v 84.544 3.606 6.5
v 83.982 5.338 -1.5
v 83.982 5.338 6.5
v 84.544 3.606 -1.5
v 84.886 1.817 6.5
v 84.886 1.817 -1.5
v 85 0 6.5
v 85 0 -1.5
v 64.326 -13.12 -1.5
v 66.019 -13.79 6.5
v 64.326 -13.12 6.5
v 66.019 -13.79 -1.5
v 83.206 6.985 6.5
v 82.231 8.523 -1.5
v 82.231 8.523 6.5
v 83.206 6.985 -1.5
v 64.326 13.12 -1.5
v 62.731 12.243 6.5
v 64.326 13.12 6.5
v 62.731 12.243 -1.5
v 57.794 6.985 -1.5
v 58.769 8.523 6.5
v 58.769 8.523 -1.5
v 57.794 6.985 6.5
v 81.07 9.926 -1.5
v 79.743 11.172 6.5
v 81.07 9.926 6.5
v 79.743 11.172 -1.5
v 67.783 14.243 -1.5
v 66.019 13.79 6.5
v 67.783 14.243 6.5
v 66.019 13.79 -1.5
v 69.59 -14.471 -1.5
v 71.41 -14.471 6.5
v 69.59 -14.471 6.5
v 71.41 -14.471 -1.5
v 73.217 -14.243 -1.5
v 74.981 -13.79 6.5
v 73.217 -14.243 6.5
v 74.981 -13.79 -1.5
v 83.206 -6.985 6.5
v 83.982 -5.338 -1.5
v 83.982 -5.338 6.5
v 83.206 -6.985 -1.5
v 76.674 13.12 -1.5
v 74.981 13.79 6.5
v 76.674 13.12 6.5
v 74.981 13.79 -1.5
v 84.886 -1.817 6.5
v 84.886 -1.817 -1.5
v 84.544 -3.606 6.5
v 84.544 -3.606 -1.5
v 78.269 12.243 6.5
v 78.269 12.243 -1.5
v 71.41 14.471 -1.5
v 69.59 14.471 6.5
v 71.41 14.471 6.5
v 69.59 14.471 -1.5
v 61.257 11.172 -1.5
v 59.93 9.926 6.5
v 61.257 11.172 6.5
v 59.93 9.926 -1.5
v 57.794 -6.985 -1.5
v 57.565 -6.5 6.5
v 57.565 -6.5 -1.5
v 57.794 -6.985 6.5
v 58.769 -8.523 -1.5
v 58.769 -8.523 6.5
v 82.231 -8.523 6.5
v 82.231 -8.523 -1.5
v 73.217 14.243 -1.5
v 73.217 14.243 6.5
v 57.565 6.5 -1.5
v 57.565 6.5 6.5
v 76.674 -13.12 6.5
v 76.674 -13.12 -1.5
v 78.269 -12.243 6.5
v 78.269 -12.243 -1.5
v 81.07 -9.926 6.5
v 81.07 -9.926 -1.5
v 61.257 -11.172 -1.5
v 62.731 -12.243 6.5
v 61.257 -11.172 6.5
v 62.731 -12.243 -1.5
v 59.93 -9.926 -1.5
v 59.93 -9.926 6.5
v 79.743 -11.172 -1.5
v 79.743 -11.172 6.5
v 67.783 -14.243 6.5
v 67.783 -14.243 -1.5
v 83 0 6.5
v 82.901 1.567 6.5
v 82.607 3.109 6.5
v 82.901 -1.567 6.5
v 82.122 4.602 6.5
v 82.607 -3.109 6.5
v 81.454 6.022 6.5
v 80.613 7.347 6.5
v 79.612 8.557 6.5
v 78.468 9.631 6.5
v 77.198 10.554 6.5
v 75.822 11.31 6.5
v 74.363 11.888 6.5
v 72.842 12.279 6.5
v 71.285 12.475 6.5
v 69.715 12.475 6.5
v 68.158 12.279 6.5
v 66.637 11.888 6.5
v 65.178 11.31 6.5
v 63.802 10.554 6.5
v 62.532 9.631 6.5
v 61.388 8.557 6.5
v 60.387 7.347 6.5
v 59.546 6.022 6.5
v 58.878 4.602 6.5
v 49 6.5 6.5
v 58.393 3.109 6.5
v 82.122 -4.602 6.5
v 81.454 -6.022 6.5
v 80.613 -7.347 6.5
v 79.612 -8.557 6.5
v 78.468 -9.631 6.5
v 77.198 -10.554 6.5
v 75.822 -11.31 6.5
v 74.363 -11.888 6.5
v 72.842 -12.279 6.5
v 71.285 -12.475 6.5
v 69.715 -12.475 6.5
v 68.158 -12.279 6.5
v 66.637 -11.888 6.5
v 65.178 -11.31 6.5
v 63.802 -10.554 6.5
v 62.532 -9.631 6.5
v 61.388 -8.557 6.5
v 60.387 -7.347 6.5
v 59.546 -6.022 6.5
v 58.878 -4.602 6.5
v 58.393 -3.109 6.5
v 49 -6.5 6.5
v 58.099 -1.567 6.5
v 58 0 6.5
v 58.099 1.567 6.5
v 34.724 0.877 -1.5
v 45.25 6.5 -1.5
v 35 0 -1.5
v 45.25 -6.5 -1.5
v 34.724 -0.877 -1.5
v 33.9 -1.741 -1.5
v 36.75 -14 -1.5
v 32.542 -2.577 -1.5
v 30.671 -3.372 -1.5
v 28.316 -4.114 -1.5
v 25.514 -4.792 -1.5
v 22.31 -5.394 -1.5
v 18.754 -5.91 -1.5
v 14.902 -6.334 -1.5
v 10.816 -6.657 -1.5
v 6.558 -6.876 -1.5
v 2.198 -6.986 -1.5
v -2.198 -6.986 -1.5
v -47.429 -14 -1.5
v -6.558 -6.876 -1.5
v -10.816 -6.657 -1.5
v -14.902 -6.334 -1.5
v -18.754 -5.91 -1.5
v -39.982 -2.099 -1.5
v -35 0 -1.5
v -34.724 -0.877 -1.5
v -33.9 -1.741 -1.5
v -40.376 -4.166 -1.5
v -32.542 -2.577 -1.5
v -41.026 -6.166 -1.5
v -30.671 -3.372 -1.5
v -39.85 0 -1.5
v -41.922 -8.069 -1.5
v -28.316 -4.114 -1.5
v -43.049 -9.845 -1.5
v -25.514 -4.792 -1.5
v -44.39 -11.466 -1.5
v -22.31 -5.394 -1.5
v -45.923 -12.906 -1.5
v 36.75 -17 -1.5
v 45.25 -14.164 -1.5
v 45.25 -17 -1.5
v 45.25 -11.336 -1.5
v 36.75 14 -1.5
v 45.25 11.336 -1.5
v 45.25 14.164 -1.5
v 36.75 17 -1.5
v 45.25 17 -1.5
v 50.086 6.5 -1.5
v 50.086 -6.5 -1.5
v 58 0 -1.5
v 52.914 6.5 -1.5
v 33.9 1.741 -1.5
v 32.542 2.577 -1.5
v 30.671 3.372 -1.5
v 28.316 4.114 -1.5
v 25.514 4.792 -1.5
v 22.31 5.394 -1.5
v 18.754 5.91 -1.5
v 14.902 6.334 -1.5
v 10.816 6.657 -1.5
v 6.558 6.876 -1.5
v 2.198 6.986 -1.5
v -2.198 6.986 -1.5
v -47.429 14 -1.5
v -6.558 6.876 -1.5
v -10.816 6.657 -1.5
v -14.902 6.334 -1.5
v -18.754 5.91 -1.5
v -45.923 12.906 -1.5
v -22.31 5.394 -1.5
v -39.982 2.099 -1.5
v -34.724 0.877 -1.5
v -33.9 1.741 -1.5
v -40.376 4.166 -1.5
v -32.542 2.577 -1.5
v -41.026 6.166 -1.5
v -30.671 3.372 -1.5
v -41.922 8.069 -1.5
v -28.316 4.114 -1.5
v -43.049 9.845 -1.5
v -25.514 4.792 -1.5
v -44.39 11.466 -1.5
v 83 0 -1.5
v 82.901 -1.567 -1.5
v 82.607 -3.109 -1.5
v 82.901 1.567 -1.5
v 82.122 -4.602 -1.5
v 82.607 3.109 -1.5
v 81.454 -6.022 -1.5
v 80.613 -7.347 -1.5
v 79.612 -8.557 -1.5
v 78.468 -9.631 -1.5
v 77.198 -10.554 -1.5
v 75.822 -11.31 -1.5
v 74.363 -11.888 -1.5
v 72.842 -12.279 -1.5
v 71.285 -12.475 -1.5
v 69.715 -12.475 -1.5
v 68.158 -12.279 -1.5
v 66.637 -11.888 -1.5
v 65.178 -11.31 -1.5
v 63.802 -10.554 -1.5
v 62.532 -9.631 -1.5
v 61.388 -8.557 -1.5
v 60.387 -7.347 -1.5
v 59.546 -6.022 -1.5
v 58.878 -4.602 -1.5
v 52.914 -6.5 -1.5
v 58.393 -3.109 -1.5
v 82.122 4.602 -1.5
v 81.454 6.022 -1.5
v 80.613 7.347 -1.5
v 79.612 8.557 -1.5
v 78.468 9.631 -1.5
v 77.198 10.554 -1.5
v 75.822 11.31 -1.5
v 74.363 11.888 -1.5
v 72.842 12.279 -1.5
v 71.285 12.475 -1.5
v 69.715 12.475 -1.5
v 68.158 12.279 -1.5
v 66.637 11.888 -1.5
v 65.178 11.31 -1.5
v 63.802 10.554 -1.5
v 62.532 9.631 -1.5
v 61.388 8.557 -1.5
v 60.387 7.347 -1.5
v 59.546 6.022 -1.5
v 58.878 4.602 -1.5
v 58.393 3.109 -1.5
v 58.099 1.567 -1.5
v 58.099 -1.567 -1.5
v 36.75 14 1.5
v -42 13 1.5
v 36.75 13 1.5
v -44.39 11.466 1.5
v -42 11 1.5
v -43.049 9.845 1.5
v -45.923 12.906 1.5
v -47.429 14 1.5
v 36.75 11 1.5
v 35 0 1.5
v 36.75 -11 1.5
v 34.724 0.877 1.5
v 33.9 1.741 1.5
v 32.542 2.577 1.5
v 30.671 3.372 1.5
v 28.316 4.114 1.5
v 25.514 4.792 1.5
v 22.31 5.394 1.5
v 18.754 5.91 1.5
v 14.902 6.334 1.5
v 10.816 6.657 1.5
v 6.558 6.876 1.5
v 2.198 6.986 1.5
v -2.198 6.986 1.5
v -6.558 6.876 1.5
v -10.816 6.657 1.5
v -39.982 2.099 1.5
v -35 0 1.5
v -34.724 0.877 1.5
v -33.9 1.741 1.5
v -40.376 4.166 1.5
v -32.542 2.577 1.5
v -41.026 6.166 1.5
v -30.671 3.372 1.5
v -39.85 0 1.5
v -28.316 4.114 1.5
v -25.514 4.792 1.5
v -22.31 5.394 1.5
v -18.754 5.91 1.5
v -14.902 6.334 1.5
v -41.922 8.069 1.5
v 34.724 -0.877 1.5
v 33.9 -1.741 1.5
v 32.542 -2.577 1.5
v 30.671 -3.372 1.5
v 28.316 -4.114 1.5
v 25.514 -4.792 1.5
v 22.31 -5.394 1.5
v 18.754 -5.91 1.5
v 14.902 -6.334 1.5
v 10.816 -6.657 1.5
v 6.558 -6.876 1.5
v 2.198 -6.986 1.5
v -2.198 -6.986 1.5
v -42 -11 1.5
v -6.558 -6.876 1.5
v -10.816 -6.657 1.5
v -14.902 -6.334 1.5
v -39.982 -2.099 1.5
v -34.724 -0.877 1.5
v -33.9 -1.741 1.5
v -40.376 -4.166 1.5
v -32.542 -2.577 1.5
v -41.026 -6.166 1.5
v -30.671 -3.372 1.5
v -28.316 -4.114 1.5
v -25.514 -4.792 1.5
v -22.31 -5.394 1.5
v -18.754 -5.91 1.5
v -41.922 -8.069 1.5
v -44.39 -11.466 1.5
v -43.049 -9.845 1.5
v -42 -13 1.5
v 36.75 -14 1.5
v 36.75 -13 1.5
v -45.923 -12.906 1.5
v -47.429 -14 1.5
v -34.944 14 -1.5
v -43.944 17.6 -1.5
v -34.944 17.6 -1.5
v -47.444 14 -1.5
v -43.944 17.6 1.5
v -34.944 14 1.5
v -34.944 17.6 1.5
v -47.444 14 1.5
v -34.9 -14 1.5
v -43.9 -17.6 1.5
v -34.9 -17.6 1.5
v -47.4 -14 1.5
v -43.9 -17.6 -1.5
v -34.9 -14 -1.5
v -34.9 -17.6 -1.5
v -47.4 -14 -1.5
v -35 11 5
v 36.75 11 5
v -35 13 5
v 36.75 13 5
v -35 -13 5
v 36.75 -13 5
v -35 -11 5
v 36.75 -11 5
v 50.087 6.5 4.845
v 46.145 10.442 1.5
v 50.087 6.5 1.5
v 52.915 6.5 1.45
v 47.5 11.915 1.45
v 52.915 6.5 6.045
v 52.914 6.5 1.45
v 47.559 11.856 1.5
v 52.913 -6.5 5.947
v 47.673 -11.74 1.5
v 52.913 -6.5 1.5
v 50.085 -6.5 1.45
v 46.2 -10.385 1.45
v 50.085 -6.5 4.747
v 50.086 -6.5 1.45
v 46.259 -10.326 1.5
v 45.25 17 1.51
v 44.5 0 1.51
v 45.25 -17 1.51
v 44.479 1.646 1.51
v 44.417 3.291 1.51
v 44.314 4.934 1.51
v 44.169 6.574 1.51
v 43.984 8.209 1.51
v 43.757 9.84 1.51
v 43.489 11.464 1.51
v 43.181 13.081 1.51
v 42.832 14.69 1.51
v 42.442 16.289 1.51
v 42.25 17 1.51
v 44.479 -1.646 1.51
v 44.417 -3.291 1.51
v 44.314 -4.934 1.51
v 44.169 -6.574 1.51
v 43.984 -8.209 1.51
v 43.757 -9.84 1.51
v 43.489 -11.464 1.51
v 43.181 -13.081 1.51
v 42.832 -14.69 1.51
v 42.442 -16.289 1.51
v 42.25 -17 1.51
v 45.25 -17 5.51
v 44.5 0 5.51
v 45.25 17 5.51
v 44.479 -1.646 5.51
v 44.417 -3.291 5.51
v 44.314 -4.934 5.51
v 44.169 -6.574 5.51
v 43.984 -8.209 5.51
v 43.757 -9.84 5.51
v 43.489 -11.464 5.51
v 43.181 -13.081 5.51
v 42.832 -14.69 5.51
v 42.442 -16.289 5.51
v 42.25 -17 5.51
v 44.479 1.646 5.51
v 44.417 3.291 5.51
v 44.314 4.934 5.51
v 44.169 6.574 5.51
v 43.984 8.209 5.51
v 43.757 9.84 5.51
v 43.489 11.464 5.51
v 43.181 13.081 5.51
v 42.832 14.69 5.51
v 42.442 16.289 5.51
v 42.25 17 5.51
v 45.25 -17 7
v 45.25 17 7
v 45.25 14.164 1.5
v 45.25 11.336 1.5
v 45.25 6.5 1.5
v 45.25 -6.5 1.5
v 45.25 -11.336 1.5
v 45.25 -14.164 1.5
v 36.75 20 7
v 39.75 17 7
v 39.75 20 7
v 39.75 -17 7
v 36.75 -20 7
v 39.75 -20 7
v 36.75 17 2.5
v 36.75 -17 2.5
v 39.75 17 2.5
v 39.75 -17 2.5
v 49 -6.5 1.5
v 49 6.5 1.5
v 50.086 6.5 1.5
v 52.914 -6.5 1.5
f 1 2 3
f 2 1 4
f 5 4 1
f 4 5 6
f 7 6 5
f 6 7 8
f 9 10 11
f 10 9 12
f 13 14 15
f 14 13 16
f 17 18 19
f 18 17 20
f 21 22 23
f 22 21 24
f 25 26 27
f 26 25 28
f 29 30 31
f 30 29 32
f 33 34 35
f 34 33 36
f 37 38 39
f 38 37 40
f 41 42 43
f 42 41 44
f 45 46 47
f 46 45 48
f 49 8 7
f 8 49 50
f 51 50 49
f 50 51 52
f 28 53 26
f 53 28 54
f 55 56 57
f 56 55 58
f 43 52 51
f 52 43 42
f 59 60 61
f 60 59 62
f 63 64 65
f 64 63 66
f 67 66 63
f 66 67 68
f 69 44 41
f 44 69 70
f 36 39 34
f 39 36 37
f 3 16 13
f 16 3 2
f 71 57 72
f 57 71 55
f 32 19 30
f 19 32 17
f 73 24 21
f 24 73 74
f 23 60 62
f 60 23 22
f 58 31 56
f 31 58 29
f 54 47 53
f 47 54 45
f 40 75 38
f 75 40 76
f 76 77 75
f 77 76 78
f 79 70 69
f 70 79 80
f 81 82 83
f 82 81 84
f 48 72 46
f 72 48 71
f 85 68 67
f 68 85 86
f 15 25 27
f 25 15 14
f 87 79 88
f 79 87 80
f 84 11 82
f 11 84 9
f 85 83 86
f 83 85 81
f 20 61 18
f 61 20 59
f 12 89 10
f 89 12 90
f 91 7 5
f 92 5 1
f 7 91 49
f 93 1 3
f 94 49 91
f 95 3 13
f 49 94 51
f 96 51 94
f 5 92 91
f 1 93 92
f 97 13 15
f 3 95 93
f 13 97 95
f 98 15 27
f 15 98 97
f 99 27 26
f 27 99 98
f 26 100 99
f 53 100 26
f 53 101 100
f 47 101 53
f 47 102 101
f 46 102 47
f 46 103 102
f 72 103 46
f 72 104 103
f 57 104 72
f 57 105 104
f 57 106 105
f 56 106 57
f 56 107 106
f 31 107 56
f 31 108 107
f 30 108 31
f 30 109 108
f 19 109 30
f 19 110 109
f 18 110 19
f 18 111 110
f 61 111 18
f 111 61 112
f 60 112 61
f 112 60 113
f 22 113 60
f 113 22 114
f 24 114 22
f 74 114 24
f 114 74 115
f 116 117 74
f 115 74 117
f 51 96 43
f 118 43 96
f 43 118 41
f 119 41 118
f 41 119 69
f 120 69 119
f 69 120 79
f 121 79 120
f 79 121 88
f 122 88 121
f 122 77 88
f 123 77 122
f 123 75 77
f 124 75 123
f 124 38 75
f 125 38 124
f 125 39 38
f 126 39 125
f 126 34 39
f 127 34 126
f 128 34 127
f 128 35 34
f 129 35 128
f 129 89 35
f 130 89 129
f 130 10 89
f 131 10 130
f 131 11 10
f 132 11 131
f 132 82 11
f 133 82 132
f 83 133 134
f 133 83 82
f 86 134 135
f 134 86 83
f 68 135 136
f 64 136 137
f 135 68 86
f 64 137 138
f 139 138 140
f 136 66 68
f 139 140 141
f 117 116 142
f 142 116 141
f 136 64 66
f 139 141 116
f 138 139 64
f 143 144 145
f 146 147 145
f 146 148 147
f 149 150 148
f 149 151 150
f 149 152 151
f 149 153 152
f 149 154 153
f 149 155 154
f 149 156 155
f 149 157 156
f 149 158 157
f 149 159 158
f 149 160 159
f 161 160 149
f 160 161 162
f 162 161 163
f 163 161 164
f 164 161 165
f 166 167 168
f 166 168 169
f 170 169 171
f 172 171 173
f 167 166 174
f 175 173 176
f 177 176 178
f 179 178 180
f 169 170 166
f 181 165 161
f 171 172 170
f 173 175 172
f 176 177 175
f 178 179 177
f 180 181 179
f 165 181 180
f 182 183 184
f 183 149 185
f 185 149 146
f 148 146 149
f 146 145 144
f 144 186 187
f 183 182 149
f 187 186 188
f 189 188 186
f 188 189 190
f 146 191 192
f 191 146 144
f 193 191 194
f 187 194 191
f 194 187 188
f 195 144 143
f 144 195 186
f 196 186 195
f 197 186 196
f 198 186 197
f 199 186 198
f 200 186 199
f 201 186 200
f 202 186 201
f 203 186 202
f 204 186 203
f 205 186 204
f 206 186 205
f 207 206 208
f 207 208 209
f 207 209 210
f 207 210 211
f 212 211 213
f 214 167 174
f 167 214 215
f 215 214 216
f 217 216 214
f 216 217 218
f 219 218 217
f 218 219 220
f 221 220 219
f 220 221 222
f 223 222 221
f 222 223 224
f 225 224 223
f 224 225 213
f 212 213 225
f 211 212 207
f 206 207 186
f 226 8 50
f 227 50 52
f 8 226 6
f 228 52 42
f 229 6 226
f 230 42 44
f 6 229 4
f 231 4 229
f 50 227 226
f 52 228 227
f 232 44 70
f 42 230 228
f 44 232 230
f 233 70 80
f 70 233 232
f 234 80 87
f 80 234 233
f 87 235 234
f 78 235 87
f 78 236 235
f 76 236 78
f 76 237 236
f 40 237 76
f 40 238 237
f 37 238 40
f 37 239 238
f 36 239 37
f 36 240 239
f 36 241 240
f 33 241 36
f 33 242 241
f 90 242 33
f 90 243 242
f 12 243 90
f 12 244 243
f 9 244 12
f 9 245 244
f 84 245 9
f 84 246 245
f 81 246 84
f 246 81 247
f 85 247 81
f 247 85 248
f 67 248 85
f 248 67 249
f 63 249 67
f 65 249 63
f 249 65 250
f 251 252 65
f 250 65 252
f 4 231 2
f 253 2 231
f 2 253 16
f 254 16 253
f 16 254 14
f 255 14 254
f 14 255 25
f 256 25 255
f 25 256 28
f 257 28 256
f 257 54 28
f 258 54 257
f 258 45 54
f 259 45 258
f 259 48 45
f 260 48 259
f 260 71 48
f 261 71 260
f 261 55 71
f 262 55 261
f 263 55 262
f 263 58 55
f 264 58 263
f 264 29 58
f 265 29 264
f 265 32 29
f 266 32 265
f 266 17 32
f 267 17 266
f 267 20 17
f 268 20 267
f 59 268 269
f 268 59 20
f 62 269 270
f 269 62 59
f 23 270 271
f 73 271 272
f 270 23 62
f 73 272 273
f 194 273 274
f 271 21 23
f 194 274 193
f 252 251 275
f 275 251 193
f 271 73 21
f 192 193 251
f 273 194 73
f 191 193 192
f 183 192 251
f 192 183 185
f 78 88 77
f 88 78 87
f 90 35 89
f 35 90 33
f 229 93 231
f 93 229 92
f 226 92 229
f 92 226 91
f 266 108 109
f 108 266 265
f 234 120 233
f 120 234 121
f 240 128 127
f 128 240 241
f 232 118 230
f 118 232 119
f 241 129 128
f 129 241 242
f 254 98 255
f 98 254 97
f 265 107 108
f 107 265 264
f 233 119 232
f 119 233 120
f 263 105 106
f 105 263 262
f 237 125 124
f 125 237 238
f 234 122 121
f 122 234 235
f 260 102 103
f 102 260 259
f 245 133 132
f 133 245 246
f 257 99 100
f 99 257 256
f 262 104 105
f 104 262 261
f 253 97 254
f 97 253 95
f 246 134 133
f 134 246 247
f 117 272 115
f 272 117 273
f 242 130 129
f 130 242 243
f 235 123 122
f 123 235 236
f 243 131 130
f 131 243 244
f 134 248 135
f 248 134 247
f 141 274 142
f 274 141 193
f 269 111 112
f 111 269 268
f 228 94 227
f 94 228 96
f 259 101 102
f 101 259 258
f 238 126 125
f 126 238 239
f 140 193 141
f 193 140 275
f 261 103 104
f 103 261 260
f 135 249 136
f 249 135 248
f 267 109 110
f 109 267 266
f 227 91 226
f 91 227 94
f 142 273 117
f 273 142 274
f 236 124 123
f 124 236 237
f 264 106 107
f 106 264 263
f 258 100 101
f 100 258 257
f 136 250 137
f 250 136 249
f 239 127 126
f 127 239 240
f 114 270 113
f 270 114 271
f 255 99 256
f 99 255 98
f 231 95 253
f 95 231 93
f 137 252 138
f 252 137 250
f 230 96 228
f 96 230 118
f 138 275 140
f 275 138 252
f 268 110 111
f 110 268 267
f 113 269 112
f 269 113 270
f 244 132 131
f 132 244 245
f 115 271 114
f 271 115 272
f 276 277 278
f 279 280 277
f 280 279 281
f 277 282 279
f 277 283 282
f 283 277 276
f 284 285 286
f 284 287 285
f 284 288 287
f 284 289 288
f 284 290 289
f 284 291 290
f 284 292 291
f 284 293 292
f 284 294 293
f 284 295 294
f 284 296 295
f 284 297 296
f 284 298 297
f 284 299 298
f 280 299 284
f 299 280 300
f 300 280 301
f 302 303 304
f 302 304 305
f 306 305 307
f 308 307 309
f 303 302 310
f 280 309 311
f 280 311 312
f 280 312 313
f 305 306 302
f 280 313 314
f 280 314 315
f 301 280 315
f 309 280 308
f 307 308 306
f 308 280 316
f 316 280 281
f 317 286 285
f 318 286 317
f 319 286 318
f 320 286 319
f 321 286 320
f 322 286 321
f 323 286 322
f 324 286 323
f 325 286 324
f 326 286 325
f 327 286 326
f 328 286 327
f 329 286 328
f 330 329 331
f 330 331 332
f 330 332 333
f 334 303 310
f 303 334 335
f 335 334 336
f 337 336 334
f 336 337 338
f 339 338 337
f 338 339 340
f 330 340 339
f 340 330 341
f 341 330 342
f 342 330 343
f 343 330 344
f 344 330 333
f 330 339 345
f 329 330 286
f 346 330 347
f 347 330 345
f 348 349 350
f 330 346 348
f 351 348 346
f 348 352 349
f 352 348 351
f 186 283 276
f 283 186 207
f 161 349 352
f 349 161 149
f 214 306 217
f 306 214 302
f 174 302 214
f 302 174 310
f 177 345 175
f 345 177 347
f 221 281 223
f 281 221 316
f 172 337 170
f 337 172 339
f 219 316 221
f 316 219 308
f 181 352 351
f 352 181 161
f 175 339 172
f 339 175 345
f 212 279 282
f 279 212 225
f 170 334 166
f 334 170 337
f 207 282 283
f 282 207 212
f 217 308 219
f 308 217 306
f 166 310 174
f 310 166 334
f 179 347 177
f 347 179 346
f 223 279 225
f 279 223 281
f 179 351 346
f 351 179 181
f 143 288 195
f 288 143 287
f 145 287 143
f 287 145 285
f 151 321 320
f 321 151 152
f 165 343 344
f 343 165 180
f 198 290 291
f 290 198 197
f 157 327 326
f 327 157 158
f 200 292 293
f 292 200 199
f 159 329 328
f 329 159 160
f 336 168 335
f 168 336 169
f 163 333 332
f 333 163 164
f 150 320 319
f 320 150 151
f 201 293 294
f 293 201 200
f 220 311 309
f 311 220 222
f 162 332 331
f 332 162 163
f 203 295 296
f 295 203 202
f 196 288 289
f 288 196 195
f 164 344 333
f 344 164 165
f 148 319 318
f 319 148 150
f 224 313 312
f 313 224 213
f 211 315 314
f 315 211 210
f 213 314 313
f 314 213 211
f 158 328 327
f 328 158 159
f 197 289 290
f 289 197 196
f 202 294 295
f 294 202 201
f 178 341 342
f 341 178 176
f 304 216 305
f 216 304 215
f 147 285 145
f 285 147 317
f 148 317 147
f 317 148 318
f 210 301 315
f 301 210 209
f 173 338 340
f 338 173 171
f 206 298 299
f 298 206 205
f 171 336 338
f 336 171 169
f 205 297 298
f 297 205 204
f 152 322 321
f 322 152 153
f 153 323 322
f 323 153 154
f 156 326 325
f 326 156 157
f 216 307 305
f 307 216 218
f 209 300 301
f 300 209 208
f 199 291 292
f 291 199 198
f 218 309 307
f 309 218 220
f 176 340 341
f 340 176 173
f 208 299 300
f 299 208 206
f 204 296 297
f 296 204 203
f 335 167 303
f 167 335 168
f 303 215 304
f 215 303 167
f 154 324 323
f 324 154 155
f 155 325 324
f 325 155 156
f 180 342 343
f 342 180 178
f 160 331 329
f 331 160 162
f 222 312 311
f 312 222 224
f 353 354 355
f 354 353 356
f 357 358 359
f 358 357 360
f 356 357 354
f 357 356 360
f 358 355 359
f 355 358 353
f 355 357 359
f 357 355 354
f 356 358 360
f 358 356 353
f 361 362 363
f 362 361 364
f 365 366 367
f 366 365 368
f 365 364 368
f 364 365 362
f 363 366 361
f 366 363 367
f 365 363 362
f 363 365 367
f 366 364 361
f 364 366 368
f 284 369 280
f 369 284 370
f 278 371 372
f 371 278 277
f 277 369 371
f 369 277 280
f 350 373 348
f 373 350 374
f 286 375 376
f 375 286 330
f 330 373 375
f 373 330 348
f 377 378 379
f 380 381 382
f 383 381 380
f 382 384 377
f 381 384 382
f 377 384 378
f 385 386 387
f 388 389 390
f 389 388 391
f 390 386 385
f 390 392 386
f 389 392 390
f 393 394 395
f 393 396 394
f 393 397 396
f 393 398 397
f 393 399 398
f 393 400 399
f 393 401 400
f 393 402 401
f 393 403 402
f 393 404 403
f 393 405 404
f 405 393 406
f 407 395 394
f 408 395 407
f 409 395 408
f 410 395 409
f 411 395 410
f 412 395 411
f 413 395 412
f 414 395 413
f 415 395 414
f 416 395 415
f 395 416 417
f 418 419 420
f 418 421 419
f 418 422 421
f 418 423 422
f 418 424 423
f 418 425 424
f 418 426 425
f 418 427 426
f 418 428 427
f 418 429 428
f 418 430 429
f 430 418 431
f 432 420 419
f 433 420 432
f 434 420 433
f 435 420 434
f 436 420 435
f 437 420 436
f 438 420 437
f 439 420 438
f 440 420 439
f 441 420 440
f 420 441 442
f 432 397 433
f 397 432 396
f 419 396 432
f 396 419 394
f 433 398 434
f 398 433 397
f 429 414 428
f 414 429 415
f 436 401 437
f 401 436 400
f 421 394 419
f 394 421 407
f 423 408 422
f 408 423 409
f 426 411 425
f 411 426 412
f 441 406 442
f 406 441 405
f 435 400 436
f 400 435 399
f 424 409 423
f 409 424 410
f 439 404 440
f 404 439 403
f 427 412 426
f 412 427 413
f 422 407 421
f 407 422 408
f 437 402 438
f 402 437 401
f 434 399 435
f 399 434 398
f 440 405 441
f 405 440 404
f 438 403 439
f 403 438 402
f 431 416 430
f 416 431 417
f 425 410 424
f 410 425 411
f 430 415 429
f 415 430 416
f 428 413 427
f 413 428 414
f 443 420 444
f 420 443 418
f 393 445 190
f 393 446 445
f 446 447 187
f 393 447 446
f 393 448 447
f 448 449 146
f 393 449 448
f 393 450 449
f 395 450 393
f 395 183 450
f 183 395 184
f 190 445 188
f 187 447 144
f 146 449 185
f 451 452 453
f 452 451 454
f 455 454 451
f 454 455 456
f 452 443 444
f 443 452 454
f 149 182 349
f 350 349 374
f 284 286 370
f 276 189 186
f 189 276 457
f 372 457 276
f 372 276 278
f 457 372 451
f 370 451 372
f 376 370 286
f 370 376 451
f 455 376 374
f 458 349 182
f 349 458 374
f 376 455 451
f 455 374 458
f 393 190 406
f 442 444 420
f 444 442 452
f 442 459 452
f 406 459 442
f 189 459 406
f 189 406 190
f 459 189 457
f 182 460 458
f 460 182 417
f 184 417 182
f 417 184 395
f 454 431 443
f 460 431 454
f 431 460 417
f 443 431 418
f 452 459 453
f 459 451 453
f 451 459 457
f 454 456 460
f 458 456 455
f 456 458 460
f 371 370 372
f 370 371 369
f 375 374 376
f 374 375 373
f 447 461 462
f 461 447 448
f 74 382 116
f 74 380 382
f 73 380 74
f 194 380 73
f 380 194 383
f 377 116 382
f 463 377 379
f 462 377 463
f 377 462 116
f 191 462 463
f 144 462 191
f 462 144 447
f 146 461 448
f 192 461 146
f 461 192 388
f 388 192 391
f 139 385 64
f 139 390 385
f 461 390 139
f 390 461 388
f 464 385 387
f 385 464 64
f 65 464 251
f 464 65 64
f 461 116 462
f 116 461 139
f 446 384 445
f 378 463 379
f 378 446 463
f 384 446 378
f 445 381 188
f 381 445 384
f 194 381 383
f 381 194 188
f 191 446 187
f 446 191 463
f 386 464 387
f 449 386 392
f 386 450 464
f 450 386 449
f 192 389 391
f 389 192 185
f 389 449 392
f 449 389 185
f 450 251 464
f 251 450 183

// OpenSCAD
/*			CHANGELOG

	V1.1 fixes the stopers at the end, and makes it better for customizer on thingiverse.
	
	V1,5 has some tweaks for the size so you don't have to scale it, and i added in a color command because i NEED all my designs to be blue.


			INTRODUCTION
This is my first scad file, but i think i did a decent job, although i still have alot to learn. Please excuse all, if any, typoes, and feel free to share with me all the ways i messed this up, if any. and if you have any problems, please leave a comment with what scad editor your using, and what exactly went wrong (screen shots are helpfull too) and i'll do my best to help you... or look up stuff on google till i can:)


Among other things, i plan on updating this file with options to customize the grip, the disks (ammo) , and maybe the ammo holder. i don't think there is anything to do with the barrel.

			INSTRUCTIONS
This should be fairly straight foward for those of you who are familiar with these types of files. All instructions given are with openscad's default editor in mind. when i say left and right, thats with the finger ring as the closest part, and your looking down the lentgh of it. If you still not sure of orientation, just play with a variable to see which piece moves or changes.


For those who aren't familiar, while i do encourage you to read through my code and try to understand what i did, that's not actually needed to tweak this file. All you need to do is measure the diameter of your finger, and input the measurements in milimeters, and end the line with a semi colon ( ; ). You can round a bit, so 25 mm can be called a inch, if you only have imperial measuring devices.


You can also adjust the quality of the finger ring and cut outs. the latter may be slightly pointless, but why not?


After you change the values and end the line with a semicolon ( ; ), you can press F5 to to preview it, this is quick. when your ready to save it as a stl file, press F6 to render the file, this can take a while depending on what you told it for the various quality settings, and than save as stl. Easy peasy.

Please note that i'm not responsible if your computer explodes, or becomes a giant fire breathing duck that yodels.
*/


/*           CUSTOMIZABLES               */


finger_size = 25;

finger_ring_face_count = 50;

center_cut_out_quality = 50;

end_cut_out_quality = 50;


/*						CODE					 feel free to play with and modify it
*/

/* i redifned these to make it easier for me*/
r = finger_size;
frq = finger_ring_face_count;
ccq = center_cut_out_quality;
ecq = end_cut_out_quality;

module slide() {
	union() {
		
//finger ring
		translate([116/2+r/2,0,2.5]) {
			difference() {
				cylinder(r=r/2+2, h = 8, center = true,$fn = frq);
				cylinder(r=r/2, h = 9, center = true,$fn = frq);
			}
		}
//circular cutout at the end of the slide and in the center of the slide, and the stoppers.
		
//this is the circular cut out at the end
		difference() {
			translate([-5,0,0]) {
			cube([92,28,3], center = true);
			}
			translate([-56.6,0,0]) {
				cylinder(r=33.5/2, h=4, center = true, $fn = ecq);
			}
//this is the oval cut out in the center.
			translate([0,0,0]) {
				scale([5,1,1]) cylinder (r = 7, h = 5, center = true, $fn = ccq);
			}
		}
		
//these are the stoppers at the end on either side of the cutout
		
		//right side
		scale([1,0.8,1]) {
			rotate([0,0,-90]) {
				translate([-17.5,-42.944,-1.5]) {
					difference() {
						linear_extrude(3) {
							hull() {
						translate([0,3.5,0]) square (9, center = true);
				circle (r=4.5, $fn = 4 );
								}
							}
							translate([5,2,0]) cube([10,20,10],center = true);
						}
					}
				}
			}
	
		//left side
		scale([1,0.8,1]) {
			rotate([0,180,-90]) {
				translate([-17.5,-42.9,-1.5]) {
					difference() {
						linear_extrude(3) {
							hull() {
								translate([0,3.5,0]) square (9, center = true);
				circle (r=4.5, $fn = 4 );
								}
							}
							translate([5,2,0]) cube([10,20,10],center = true);
						}
					}
				}
			}
		
//stablizers for the top sides
		
		//right side
		translate([2,12,3]) {
			cube([74,2,4], center = true);
		}
		translate([-43,13,1]) {
			rotate ([90,0,0]) {
				scale ([4,2,1]) {
					difference() {
						cube (2);
						rotate([0,0,45]) cube(10);
					}
				}
			}
		}
		
		//left side
		translate([2,-12,3]) {
			cube([74,2,4], center = true);
		}
		translate([-43,-11,1]) {
			rotate ([90,0,0]) {
				scale ([4,2,1]) {
					difference() {
						cube (2);
						rotate([0,0,45]) cube(10);
					}
				}
			}
		}

//conection for the finger ring
		translate([51,0,0]) {
			cube([14,13,3], center = true);
		}
		translate([53.5,0,4]) {
			cube([9,13,5], center = true);
		}
		translate([48,10,0]) {
			rotate([0,0,-45]) cube([12,2,3], center = true);
		}
			translate([48,-10,0]) {
				rotate([0,0,45]) cube([12,2,3], center = true);
		}
			translate([47.5,11.915,1.45]) {
				rotate ([90,0,-45]) {
					scale ([4,2.4,1]) {
					difference() {
						cube (2);
						rotate([0,0,45]) cube(10);
					}
				}
			}
		}
		translate([46.2,-10.385,1.45]) {
			rotate ([90,0,45]) {
				scale ([4,2.4,1]) {
					difference() {
						cube (2);
						rotate([0,0,45]) cube(10);
					}
				}
			}
		}
		
//rubberband retainer, has a large ring for the indent the rubber band goes into, and little triangle ears.
		difference() {
		translate([41,0,2.75]) {
			cube([8.5,34,8.5], center = true);
			}
			//this is the ring indent
			translate([-21,0,3.51]) {
				difference() {
					cylinder(r=70, h = 4, $fn = 90, center = true);
					cylinder(r= 65.5, h = 5, $fn = 250, center = true);
				}
			}
		}
		//left triangle stop ear
		translate([36.75,20,7]) {
				rotate ([-90,0,-90]) {
					scale ([1,1.5,1]) {
					difference() {
						cube (3);
						rotate([0,0,45]) cube(10);
					}
				}
			}
		}
		//right triangle stop ear
		translate([39.75,-20,7]) {
			rotate ([-90,0,90]) {
				scale ([1,1.5,1]) {
					difference() {
						cube (3);
						rotate([0,0,45]) cube(10);
					}
				}
			}
		}
	}
}

color("cyan") {
	slide();
}

//still no firebreathing duck? i must've done somthing wrong...
